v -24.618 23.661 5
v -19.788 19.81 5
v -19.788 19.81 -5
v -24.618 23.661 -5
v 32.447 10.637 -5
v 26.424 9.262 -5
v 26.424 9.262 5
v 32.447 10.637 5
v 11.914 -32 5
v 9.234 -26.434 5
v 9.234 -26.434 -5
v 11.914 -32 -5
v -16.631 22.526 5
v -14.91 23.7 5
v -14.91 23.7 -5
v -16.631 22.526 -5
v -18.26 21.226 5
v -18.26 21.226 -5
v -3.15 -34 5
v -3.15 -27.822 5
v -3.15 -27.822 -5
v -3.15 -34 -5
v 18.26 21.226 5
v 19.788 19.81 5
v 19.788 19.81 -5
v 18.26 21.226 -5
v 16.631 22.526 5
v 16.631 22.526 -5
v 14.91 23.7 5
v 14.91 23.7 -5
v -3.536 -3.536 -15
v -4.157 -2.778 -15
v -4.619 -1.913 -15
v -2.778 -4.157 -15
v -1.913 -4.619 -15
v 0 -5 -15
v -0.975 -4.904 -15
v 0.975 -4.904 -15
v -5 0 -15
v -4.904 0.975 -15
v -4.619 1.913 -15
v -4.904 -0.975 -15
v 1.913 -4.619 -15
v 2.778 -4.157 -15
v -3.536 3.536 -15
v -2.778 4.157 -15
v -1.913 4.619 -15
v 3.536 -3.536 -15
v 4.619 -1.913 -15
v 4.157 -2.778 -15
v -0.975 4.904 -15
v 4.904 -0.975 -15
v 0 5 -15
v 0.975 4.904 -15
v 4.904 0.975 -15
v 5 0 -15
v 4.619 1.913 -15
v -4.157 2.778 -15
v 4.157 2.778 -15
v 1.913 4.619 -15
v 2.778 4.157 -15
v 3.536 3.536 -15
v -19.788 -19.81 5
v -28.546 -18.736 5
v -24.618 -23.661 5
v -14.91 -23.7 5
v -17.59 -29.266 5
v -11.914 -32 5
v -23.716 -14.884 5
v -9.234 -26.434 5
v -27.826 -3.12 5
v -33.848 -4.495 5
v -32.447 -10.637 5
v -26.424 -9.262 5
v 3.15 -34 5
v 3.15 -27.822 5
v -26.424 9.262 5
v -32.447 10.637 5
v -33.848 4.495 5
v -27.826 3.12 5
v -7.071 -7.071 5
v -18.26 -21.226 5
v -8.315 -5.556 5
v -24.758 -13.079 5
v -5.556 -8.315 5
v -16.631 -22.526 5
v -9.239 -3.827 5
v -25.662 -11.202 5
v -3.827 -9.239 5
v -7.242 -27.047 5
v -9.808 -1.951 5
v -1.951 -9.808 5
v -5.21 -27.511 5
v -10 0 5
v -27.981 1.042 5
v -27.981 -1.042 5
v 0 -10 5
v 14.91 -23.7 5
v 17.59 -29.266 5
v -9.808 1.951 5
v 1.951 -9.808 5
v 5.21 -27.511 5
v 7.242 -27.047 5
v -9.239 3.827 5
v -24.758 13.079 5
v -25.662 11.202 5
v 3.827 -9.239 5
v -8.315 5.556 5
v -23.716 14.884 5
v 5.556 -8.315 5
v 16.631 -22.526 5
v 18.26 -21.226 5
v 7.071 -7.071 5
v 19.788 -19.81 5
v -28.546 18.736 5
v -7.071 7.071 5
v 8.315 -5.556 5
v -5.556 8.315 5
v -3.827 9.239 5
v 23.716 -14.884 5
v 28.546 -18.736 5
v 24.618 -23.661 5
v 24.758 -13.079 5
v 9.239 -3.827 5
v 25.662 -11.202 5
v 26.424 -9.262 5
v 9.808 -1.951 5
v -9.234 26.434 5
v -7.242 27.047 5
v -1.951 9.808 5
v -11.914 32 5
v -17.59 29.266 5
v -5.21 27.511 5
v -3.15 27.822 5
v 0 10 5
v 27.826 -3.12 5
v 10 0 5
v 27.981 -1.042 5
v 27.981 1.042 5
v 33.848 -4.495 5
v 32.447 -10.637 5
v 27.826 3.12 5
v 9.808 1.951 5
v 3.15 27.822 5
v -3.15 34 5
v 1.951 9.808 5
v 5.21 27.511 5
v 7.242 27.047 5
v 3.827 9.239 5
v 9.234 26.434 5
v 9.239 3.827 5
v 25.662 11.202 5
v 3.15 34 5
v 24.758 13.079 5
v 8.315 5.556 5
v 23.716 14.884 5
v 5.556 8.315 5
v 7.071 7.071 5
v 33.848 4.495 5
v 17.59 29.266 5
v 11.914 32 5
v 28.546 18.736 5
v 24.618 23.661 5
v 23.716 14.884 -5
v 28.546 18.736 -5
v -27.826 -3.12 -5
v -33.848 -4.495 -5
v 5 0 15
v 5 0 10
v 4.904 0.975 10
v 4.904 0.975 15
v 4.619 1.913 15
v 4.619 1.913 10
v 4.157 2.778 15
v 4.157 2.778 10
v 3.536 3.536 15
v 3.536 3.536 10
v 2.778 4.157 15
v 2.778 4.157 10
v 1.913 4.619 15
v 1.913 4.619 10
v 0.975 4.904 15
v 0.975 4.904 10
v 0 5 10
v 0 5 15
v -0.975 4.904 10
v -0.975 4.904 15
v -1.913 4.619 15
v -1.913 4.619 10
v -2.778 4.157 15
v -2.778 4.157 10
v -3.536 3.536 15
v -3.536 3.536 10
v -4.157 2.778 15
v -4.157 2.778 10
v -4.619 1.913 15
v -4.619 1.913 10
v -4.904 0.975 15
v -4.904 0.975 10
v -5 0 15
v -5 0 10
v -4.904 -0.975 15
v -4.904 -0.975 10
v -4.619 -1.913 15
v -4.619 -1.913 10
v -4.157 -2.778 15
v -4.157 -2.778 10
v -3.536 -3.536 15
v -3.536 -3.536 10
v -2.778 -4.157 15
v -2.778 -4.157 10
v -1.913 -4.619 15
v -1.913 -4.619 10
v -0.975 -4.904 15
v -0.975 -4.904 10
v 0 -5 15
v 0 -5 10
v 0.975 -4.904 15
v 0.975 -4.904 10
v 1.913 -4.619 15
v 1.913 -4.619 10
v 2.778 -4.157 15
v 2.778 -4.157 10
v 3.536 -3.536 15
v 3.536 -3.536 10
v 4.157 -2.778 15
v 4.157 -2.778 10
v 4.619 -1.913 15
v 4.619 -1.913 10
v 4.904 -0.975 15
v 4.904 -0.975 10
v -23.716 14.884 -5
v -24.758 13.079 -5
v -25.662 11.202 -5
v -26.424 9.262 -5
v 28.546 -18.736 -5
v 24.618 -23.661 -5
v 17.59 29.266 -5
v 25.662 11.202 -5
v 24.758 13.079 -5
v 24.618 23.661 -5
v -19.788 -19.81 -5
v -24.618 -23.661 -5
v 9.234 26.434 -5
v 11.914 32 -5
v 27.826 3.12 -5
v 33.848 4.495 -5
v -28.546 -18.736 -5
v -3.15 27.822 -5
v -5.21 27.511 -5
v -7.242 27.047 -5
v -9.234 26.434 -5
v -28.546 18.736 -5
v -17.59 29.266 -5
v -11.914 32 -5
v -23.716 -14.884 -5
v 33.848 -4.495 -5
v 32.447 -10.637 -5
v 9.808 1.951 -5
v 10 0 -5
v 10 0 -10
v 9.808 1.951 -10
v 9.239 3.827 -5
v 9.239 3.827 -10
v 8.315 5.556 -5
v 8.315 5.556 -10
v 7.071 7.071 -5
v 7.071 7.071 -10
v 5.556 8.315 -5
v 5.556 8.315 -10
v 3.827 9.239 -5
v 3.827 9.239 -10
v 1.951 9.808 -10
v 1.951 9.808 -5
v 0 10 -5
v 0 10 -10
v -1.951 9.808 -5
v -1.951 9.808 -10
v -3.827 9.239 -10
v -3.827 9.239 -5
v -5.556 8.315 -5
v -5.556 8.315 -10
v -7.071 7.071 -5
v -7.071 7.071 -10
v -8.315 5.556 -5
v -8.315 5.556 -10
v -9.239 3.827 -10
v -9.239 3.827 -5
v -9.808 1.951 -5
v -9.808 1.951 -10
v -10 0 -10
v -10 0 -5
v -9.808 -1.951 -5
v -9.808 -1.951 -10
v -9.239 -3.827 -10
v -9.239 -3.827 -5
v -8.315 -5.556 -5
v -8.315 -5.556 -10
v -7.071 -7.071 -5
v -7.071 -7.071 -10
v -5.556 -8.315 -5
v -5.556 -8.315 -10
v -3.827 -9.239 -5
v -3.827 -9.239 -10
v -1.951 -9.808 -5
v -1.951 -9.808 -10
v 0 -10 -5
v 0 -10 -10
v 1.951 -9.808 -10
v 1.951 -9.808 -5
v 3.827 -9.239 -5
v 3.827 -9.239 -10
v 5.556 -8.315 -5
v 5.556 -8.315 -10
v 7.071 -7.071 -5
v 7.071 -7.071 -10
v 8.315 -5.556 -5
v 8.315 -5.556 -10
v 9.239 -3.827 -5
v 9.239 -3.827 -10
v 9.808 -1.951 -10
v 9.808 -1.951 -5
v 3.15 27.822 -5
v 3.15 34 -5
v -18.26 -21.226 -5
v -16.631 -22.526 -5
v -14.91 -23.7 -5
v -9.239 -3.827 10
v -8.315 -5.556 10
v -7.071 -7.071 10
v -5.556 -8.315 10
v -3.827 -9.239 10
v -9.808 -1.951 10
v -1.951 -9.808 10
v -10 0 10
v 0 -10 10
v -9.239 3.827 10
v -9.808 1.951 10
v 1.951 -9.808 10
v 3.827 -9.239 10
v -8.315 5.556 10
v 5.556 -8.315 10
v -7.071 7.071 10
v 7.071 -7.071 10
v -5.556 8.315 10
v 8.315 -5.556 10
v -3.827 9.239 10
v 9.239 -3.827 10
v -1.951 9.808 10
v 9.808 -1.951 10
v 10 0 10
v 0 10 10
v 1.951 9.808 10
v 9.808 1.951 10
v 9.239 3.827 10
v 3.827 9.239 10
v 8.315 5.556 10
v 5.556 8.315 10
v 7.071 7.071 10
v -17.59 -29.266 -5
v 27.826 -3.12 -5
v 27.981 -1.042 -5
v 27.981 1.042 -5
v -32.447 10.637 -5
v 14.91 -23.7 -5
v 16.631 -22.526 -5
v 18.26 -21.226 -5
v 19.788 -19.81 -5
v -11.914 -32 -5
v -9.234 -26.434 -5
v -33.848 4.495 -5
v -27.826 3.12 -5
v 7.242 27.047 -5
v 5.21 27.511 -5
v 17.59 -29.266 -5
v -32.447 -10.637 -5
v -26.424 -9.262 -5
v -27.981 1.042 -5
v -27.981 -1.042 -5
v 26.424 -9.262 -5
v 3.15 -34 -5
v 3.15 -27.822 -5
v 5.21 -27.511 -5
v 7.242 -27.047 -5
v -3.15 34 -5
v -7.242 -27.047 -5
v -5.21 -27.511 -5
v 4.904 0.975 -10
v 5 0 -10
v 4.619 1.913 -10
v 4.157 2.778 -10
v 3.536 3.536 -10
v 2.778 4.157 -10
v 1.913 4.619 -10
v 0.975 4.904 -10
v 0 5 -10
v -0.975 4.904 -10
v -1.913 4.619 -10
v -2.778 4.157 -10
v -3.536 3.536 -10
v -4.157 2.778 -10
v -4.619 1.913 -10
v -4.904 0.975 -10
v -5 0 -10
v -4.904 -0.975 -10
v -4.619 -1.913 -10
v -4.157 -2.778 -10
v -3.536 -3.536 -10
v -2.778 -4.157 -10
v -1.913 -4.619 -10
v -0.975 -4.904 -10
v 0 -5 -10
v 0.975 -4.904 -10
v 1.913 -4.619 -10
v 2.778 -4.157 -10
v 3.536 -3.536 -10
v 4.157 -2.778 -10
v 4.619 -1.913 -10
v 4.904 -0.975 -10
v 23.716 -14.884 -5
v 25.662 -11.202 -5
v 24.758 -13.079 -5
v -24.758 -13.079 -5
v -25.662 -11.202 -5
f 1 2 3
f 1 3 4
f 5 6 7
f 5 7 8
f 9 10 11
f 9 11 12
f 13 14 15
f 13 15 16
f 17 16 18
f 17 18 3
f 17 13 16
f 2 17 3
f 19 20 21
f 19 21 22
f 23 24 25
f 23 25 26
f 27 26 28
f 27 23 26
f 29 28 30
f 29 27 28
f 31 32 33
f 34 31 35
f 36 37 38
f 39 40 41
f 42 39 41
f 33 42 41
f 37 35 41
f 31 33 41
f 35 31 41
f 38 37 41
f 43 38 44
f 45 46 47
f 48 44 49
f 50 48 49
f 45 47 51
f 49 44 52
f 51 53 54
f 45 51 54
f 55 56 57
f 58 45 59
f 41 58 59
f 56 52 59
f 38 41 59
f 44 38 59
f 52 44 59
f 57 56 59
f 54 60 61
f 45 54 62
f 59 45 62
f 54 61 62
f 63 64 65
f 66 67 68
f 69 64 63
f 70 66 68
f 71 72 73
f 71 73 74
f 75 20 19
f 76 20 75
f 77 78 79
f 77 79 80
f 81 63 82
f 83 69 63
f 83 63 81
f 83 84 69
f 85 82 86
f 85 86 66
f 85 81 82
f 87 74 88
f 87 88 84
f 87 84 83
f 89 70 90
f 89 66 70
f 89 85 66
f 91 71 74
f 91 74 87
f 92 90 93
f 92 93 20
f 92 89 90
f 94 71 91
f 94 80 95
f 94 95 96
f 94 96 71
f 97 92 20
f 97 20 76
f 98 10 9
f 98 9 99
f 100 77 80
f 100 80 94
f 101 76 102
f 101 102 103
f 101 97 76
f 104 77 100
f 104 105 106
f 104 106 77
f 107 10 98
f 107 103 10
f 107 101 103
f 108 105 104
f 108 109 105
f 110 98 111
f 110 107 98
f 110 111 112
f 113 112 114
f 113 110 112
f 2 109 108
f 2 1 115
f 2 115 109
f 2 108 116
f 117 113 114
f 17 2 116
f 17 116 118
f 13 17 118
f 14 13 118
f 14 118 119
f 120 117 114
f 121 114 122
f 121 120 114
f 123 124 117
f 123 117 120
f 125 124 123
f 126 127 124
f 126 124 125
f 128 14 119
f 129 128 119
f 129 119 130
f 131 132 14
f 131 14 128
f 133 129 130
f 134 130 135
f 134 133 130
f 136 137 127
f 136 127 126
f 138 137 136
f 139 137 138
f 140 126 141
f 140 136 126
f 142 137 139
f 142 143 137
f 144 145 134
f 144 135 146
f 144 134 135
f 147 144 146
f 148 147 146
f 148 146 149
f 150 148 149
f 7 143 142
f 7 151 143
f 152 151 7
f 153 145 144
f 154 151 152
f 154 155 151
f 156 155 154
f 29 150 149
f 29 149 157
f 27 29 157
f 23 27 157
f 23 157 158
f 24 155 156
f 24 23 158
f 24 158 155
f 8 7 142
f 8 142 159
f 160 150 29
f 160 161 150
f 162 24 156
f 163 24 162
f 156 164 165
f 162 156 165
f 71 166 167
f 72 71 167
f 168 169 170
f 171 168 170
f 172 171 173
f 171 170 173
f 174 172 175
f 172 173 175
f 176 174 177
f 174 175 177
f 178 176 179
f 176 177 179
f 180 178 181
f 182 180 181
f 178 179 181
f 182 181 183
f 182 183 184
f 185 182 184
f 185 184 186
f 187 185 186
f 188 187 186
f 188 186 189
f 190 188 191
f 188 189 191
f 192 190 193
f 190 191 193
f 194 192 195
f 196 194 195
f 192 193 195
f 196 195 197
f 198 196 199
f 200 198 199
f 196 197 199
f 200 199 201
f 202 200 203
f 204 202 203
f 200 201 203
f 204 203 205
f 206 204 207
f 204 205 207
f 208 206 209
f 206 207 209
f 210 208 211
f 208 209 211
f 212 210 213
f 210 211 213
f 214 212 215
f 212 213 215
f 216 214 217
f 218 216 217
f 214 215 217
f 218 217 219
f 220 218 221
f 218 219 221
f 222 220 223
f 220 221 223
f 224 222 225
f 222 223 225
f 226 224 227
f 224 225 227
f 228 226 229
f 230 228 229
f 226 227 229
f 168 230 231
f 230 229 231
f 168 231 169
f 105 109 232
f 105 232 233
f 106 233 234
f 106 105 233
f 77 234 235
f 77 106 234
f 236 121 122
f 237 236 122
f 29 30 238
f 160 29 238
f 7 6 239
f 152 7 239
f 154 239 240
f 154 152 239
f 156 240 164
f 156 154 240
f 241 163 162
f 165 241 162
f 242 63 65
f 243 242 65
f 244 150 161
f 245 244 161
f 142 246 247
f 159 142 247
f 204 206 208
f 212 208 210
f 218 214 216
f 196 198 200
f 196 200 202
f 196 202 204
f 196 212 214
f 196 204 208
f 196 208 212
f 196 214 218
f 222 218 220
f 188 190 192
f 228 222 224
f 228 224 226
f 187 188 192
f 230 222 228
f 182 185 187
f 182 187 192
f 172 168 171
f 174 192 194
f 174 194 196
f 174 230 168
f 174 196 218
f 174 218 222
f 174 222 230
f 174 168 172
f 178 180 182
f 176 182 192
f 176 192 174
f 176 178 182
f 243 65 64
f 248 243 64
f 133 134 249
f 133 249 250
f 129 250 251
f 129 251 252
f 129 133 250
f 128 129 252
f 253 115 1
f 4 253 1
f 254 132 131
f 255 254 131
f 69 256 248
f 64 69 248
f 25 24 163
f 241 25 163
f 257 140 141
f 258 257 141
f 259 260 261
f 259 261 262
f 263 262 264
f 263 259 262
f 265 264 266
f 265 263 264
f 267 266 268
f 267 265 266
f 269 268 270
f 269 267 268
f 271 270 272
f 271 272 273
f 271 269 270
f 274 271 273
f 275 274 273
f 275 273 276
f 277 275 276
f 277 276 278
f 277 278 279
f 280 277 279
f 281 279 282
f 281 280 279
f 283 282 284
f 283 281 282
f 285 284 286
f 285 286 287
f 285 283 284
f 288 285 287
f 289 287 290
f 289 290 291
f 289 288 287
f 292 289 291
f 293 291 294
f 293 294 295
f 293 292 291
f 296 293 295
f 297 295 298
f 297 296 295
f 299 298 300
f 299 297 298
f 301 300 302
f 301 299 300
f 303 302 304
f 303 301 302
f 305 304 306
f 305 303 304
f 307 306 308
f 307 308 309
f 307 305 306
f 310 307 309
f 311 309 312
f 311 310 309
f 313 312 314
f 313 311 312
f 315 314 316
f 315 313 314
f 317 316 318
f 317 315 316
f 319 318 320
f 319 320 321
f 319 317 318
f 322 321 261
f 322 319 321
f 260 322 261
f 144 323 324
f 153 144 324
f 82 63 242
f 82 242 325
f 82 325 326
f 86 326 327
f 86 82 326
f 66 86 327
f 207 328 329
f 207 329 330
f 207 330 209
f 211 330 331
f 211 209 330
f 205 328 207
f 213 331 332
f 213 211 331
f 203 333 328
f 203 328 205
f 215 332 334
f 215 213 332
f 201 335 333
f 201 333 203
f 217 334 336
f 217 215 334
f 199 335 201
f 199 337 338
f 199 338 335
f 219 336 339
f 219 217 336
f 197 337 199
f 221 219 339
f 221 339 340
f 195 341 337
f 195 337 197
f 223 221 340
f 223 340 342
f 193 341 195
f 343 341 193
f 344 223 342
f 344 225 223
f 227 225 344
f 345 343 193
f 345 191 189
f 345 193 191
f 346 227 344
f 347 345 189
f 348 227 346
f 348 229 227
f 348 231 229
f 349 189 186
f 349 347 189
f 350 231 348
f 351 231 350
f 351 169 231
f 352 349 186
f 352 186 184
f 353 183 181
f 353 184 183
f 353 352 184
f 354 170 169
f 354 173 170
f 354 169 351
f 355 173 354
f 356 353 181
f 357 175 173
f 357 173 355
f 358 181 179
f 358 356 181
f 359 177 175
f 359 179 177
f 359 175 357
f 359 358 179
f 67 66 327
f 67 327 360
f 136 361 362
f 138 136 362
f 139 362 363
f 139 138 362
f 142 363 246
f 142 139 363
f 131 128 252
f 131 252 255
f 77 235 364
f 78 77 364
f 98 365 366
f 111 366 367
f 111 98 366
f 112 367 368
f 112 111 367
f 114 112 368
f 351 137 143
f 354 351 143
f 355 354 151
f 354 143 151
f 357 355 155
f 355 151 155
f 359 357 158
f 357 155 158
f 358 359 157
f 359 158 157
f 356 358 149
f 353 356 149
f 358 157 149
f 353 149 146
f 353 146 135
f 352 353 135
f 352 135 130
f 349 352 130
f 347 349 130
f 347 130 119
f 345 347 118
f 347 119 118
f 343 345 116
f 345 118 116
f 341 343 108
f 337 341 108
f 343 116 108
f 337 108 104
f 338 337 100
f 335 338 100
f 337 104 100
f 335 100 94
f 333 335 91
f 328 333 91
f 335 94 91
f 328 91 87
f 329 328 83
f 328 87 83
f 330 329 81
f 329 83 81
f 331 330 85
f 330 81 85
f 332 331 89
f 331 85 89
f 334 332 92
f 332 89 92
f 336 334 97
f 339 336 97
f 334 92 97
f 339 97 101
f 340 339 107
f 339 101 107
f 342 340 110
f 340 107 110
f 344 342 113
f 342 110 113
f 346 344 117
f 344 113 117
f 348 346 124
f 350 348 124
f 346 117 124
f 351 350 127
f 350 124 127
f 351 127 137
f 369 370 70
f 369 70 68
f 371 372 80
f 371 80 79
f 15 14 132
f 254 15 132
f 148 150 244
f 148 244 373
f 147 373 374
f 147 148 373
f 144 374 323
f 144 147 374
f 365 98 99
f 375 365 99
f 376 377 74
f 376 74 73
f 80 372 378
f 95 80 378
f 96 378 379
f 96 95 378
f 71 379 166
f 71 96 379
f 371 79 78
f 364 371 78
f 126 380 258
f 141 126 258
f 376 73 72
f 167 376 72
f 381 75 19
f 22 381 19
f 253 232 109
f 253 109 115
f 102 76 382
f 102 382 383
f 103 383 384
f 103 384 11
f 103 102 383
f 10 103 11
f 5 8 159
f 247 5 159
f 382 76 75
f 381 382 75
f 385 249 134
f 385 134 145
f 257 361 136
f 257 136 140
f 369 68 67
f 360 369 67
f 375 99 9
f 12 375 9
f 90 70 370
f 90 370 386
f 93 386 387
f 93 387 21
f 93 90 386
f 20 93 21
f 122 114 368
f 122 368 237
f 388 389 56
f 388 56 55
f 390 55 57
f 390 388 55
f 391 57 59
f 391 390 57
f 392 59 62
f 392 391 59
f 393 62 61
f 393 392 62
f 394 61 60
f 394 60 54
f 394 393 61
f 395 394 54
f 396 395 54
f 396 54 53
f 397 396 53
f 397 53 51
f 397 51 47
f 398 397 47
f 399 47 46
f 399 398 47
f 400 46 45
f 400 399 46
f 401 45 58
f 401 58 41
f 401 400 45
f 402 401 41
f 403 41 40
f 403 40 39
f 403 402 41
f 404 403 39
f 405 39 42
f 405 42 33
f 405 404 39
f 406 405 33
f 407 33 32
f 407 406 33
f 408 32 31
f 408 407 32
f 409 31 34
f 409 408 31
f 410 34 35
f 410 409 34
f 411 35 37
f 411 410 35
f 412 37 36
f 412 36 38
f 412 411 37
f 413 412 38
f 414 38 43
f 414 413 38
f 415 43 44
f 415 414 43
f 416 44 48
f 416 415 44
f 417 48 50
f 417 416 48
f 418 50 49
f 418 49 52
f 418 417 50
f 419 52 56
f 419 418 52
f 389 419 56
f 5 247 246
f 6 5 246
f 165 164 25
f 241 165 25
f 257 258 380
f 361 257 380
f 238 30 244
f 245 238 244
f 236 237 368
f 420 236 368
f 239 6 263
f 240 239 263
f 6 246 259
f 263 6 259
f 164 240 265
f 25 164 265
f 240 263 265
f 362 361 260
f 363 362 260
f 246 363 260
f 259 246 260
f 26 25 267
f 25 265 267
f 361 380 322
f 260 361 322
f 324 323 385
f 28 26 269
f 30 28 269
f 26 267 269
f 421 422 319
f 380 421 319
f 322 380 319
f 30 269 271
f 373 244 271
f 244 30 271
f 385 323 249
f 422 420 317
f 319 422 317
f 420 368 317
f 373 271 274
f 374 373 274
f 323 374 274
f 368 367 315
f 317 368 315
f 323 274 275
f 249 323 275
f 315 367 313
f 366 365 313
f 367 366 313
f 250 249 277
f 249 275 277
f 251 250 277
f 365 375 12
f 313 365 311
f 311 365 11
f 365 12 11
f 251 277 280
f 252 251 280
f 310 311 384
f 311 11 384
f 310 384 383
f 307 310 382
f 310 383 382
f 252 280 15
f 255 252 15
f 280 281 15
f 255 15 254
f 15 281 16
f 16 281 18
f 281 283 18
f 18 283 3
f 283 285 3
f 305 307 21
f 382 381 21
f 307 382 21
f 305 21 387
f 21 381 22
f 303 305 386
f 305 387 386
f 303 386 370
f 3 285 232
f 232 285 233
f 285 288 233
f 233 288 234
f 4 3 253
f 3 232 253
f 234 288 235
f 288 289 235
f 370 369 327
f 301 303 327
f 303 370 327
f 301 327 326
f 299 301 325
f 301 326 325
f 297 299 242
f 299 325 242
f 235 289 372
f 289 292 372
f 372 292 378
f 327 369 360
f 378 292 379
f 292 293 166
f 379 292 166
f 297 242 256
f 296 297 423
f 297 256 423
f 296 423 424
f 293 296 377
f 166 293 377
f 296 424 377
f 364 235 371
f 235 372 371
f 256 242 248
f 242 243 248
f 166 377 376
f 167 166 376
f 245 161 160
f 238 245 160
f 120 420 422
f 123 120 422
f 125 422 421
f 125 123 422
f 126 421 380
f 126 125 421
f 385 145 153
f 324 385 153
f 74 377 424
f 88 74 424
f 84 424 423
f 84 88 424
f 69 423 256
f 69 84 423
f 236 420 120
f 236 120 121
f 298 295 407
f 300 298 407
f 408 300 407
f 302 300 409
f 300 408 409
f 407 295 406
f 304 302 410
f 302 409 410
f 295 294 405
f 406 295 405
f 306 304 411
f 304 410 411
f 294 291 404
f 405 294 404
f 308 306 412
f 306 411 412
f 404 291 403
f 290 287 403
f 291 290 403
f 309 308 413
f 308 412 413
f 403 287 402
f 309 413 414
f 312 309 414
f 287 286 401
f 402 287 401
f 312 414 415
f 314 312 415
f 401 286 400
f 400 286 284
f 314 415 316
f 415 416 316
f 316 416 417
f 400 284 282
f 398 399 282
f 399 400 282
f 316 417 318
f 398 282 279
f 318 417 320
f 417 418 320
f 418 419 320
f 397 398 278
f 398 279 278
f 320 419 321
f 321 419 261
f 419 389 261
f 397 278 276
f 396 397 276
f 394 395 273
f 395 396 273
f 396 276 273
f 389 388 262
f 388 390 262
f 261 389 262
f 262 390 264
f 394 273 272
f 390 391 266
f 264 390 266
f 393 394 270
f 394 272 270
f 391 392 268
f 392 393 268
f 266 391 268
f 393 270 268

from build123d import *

# Parameters (mm, degrees)
SKETCH2_R           = 28
BOSS_EXTRUDE1_DEPTH = 5
SKETCH5_W           = 6.3
SKETCH5_H           = 12
BOSS_EXTRUDE2_DEPTH = 10
CIRPATTERN1_COUNT   = 14
SKETCH6_R           = 10
BOSS_EXTRUDE3_DEPTH = 5
SKETCH7_R           = 5
BOSS_EXTRUDE4_DEPTH = 5


with BuildPart() as part:
    # Sketch2 → Boss-Extrude1 (new, symmetric)
    with BuildSketch(Plane.XY):
        Circle(SKETCH2_R)
    extrude(amount=BOSS_EXTRUDE1_DEPTH, both=True)

    # Sketch5 → Boss-Extrude2 (add)
    with BuildSketch(Plane.XY.offset(5)):
        with Locations((0, 28)):
            Rectangle(SKETCH5_W, SKETCH5_H)
    boss_extrude2 = extrude(amount=-BOSS_EXTRUDE2_DEPTH)

    # CirPattern1: Boss-Extrude2 ×14 about axis
    cirpattern1_axis = Axis((0, 0, 0), (0, 0, 1))
    for i in range(1, CIRPATTERN1_COUNT):
        add(boss_extrude2.rotate(cirpattern1_axis, i * 360 / CIRPATTERN1_COUNT))

    # Sketch6 → Boss-Extrude3 (add)
    with BuildSketch(Plane.XY.offset(5)):
        Circle(SKETCH6_R)
    boss_extrude3 = extrude(amount=BOSS_EXTRUDE3_DEPTH)

    # Sketch7 → Boss-Extrude4 (add)
    with BuildSketch(Plane.XY.offset(10)):
        Circle(SKETCH7_R)
    boss_extrude4 = extrude(amount=BOSS_EXTRUDE4_DEPTH)

    # Mirror1: Boss-Extrude3, Boss-Extrude4 across plane
    add(boss_extrude3.mirror(Plane.XY))
    add(boss_extrude4.mirror(Plane.XY))


solid = part.part
